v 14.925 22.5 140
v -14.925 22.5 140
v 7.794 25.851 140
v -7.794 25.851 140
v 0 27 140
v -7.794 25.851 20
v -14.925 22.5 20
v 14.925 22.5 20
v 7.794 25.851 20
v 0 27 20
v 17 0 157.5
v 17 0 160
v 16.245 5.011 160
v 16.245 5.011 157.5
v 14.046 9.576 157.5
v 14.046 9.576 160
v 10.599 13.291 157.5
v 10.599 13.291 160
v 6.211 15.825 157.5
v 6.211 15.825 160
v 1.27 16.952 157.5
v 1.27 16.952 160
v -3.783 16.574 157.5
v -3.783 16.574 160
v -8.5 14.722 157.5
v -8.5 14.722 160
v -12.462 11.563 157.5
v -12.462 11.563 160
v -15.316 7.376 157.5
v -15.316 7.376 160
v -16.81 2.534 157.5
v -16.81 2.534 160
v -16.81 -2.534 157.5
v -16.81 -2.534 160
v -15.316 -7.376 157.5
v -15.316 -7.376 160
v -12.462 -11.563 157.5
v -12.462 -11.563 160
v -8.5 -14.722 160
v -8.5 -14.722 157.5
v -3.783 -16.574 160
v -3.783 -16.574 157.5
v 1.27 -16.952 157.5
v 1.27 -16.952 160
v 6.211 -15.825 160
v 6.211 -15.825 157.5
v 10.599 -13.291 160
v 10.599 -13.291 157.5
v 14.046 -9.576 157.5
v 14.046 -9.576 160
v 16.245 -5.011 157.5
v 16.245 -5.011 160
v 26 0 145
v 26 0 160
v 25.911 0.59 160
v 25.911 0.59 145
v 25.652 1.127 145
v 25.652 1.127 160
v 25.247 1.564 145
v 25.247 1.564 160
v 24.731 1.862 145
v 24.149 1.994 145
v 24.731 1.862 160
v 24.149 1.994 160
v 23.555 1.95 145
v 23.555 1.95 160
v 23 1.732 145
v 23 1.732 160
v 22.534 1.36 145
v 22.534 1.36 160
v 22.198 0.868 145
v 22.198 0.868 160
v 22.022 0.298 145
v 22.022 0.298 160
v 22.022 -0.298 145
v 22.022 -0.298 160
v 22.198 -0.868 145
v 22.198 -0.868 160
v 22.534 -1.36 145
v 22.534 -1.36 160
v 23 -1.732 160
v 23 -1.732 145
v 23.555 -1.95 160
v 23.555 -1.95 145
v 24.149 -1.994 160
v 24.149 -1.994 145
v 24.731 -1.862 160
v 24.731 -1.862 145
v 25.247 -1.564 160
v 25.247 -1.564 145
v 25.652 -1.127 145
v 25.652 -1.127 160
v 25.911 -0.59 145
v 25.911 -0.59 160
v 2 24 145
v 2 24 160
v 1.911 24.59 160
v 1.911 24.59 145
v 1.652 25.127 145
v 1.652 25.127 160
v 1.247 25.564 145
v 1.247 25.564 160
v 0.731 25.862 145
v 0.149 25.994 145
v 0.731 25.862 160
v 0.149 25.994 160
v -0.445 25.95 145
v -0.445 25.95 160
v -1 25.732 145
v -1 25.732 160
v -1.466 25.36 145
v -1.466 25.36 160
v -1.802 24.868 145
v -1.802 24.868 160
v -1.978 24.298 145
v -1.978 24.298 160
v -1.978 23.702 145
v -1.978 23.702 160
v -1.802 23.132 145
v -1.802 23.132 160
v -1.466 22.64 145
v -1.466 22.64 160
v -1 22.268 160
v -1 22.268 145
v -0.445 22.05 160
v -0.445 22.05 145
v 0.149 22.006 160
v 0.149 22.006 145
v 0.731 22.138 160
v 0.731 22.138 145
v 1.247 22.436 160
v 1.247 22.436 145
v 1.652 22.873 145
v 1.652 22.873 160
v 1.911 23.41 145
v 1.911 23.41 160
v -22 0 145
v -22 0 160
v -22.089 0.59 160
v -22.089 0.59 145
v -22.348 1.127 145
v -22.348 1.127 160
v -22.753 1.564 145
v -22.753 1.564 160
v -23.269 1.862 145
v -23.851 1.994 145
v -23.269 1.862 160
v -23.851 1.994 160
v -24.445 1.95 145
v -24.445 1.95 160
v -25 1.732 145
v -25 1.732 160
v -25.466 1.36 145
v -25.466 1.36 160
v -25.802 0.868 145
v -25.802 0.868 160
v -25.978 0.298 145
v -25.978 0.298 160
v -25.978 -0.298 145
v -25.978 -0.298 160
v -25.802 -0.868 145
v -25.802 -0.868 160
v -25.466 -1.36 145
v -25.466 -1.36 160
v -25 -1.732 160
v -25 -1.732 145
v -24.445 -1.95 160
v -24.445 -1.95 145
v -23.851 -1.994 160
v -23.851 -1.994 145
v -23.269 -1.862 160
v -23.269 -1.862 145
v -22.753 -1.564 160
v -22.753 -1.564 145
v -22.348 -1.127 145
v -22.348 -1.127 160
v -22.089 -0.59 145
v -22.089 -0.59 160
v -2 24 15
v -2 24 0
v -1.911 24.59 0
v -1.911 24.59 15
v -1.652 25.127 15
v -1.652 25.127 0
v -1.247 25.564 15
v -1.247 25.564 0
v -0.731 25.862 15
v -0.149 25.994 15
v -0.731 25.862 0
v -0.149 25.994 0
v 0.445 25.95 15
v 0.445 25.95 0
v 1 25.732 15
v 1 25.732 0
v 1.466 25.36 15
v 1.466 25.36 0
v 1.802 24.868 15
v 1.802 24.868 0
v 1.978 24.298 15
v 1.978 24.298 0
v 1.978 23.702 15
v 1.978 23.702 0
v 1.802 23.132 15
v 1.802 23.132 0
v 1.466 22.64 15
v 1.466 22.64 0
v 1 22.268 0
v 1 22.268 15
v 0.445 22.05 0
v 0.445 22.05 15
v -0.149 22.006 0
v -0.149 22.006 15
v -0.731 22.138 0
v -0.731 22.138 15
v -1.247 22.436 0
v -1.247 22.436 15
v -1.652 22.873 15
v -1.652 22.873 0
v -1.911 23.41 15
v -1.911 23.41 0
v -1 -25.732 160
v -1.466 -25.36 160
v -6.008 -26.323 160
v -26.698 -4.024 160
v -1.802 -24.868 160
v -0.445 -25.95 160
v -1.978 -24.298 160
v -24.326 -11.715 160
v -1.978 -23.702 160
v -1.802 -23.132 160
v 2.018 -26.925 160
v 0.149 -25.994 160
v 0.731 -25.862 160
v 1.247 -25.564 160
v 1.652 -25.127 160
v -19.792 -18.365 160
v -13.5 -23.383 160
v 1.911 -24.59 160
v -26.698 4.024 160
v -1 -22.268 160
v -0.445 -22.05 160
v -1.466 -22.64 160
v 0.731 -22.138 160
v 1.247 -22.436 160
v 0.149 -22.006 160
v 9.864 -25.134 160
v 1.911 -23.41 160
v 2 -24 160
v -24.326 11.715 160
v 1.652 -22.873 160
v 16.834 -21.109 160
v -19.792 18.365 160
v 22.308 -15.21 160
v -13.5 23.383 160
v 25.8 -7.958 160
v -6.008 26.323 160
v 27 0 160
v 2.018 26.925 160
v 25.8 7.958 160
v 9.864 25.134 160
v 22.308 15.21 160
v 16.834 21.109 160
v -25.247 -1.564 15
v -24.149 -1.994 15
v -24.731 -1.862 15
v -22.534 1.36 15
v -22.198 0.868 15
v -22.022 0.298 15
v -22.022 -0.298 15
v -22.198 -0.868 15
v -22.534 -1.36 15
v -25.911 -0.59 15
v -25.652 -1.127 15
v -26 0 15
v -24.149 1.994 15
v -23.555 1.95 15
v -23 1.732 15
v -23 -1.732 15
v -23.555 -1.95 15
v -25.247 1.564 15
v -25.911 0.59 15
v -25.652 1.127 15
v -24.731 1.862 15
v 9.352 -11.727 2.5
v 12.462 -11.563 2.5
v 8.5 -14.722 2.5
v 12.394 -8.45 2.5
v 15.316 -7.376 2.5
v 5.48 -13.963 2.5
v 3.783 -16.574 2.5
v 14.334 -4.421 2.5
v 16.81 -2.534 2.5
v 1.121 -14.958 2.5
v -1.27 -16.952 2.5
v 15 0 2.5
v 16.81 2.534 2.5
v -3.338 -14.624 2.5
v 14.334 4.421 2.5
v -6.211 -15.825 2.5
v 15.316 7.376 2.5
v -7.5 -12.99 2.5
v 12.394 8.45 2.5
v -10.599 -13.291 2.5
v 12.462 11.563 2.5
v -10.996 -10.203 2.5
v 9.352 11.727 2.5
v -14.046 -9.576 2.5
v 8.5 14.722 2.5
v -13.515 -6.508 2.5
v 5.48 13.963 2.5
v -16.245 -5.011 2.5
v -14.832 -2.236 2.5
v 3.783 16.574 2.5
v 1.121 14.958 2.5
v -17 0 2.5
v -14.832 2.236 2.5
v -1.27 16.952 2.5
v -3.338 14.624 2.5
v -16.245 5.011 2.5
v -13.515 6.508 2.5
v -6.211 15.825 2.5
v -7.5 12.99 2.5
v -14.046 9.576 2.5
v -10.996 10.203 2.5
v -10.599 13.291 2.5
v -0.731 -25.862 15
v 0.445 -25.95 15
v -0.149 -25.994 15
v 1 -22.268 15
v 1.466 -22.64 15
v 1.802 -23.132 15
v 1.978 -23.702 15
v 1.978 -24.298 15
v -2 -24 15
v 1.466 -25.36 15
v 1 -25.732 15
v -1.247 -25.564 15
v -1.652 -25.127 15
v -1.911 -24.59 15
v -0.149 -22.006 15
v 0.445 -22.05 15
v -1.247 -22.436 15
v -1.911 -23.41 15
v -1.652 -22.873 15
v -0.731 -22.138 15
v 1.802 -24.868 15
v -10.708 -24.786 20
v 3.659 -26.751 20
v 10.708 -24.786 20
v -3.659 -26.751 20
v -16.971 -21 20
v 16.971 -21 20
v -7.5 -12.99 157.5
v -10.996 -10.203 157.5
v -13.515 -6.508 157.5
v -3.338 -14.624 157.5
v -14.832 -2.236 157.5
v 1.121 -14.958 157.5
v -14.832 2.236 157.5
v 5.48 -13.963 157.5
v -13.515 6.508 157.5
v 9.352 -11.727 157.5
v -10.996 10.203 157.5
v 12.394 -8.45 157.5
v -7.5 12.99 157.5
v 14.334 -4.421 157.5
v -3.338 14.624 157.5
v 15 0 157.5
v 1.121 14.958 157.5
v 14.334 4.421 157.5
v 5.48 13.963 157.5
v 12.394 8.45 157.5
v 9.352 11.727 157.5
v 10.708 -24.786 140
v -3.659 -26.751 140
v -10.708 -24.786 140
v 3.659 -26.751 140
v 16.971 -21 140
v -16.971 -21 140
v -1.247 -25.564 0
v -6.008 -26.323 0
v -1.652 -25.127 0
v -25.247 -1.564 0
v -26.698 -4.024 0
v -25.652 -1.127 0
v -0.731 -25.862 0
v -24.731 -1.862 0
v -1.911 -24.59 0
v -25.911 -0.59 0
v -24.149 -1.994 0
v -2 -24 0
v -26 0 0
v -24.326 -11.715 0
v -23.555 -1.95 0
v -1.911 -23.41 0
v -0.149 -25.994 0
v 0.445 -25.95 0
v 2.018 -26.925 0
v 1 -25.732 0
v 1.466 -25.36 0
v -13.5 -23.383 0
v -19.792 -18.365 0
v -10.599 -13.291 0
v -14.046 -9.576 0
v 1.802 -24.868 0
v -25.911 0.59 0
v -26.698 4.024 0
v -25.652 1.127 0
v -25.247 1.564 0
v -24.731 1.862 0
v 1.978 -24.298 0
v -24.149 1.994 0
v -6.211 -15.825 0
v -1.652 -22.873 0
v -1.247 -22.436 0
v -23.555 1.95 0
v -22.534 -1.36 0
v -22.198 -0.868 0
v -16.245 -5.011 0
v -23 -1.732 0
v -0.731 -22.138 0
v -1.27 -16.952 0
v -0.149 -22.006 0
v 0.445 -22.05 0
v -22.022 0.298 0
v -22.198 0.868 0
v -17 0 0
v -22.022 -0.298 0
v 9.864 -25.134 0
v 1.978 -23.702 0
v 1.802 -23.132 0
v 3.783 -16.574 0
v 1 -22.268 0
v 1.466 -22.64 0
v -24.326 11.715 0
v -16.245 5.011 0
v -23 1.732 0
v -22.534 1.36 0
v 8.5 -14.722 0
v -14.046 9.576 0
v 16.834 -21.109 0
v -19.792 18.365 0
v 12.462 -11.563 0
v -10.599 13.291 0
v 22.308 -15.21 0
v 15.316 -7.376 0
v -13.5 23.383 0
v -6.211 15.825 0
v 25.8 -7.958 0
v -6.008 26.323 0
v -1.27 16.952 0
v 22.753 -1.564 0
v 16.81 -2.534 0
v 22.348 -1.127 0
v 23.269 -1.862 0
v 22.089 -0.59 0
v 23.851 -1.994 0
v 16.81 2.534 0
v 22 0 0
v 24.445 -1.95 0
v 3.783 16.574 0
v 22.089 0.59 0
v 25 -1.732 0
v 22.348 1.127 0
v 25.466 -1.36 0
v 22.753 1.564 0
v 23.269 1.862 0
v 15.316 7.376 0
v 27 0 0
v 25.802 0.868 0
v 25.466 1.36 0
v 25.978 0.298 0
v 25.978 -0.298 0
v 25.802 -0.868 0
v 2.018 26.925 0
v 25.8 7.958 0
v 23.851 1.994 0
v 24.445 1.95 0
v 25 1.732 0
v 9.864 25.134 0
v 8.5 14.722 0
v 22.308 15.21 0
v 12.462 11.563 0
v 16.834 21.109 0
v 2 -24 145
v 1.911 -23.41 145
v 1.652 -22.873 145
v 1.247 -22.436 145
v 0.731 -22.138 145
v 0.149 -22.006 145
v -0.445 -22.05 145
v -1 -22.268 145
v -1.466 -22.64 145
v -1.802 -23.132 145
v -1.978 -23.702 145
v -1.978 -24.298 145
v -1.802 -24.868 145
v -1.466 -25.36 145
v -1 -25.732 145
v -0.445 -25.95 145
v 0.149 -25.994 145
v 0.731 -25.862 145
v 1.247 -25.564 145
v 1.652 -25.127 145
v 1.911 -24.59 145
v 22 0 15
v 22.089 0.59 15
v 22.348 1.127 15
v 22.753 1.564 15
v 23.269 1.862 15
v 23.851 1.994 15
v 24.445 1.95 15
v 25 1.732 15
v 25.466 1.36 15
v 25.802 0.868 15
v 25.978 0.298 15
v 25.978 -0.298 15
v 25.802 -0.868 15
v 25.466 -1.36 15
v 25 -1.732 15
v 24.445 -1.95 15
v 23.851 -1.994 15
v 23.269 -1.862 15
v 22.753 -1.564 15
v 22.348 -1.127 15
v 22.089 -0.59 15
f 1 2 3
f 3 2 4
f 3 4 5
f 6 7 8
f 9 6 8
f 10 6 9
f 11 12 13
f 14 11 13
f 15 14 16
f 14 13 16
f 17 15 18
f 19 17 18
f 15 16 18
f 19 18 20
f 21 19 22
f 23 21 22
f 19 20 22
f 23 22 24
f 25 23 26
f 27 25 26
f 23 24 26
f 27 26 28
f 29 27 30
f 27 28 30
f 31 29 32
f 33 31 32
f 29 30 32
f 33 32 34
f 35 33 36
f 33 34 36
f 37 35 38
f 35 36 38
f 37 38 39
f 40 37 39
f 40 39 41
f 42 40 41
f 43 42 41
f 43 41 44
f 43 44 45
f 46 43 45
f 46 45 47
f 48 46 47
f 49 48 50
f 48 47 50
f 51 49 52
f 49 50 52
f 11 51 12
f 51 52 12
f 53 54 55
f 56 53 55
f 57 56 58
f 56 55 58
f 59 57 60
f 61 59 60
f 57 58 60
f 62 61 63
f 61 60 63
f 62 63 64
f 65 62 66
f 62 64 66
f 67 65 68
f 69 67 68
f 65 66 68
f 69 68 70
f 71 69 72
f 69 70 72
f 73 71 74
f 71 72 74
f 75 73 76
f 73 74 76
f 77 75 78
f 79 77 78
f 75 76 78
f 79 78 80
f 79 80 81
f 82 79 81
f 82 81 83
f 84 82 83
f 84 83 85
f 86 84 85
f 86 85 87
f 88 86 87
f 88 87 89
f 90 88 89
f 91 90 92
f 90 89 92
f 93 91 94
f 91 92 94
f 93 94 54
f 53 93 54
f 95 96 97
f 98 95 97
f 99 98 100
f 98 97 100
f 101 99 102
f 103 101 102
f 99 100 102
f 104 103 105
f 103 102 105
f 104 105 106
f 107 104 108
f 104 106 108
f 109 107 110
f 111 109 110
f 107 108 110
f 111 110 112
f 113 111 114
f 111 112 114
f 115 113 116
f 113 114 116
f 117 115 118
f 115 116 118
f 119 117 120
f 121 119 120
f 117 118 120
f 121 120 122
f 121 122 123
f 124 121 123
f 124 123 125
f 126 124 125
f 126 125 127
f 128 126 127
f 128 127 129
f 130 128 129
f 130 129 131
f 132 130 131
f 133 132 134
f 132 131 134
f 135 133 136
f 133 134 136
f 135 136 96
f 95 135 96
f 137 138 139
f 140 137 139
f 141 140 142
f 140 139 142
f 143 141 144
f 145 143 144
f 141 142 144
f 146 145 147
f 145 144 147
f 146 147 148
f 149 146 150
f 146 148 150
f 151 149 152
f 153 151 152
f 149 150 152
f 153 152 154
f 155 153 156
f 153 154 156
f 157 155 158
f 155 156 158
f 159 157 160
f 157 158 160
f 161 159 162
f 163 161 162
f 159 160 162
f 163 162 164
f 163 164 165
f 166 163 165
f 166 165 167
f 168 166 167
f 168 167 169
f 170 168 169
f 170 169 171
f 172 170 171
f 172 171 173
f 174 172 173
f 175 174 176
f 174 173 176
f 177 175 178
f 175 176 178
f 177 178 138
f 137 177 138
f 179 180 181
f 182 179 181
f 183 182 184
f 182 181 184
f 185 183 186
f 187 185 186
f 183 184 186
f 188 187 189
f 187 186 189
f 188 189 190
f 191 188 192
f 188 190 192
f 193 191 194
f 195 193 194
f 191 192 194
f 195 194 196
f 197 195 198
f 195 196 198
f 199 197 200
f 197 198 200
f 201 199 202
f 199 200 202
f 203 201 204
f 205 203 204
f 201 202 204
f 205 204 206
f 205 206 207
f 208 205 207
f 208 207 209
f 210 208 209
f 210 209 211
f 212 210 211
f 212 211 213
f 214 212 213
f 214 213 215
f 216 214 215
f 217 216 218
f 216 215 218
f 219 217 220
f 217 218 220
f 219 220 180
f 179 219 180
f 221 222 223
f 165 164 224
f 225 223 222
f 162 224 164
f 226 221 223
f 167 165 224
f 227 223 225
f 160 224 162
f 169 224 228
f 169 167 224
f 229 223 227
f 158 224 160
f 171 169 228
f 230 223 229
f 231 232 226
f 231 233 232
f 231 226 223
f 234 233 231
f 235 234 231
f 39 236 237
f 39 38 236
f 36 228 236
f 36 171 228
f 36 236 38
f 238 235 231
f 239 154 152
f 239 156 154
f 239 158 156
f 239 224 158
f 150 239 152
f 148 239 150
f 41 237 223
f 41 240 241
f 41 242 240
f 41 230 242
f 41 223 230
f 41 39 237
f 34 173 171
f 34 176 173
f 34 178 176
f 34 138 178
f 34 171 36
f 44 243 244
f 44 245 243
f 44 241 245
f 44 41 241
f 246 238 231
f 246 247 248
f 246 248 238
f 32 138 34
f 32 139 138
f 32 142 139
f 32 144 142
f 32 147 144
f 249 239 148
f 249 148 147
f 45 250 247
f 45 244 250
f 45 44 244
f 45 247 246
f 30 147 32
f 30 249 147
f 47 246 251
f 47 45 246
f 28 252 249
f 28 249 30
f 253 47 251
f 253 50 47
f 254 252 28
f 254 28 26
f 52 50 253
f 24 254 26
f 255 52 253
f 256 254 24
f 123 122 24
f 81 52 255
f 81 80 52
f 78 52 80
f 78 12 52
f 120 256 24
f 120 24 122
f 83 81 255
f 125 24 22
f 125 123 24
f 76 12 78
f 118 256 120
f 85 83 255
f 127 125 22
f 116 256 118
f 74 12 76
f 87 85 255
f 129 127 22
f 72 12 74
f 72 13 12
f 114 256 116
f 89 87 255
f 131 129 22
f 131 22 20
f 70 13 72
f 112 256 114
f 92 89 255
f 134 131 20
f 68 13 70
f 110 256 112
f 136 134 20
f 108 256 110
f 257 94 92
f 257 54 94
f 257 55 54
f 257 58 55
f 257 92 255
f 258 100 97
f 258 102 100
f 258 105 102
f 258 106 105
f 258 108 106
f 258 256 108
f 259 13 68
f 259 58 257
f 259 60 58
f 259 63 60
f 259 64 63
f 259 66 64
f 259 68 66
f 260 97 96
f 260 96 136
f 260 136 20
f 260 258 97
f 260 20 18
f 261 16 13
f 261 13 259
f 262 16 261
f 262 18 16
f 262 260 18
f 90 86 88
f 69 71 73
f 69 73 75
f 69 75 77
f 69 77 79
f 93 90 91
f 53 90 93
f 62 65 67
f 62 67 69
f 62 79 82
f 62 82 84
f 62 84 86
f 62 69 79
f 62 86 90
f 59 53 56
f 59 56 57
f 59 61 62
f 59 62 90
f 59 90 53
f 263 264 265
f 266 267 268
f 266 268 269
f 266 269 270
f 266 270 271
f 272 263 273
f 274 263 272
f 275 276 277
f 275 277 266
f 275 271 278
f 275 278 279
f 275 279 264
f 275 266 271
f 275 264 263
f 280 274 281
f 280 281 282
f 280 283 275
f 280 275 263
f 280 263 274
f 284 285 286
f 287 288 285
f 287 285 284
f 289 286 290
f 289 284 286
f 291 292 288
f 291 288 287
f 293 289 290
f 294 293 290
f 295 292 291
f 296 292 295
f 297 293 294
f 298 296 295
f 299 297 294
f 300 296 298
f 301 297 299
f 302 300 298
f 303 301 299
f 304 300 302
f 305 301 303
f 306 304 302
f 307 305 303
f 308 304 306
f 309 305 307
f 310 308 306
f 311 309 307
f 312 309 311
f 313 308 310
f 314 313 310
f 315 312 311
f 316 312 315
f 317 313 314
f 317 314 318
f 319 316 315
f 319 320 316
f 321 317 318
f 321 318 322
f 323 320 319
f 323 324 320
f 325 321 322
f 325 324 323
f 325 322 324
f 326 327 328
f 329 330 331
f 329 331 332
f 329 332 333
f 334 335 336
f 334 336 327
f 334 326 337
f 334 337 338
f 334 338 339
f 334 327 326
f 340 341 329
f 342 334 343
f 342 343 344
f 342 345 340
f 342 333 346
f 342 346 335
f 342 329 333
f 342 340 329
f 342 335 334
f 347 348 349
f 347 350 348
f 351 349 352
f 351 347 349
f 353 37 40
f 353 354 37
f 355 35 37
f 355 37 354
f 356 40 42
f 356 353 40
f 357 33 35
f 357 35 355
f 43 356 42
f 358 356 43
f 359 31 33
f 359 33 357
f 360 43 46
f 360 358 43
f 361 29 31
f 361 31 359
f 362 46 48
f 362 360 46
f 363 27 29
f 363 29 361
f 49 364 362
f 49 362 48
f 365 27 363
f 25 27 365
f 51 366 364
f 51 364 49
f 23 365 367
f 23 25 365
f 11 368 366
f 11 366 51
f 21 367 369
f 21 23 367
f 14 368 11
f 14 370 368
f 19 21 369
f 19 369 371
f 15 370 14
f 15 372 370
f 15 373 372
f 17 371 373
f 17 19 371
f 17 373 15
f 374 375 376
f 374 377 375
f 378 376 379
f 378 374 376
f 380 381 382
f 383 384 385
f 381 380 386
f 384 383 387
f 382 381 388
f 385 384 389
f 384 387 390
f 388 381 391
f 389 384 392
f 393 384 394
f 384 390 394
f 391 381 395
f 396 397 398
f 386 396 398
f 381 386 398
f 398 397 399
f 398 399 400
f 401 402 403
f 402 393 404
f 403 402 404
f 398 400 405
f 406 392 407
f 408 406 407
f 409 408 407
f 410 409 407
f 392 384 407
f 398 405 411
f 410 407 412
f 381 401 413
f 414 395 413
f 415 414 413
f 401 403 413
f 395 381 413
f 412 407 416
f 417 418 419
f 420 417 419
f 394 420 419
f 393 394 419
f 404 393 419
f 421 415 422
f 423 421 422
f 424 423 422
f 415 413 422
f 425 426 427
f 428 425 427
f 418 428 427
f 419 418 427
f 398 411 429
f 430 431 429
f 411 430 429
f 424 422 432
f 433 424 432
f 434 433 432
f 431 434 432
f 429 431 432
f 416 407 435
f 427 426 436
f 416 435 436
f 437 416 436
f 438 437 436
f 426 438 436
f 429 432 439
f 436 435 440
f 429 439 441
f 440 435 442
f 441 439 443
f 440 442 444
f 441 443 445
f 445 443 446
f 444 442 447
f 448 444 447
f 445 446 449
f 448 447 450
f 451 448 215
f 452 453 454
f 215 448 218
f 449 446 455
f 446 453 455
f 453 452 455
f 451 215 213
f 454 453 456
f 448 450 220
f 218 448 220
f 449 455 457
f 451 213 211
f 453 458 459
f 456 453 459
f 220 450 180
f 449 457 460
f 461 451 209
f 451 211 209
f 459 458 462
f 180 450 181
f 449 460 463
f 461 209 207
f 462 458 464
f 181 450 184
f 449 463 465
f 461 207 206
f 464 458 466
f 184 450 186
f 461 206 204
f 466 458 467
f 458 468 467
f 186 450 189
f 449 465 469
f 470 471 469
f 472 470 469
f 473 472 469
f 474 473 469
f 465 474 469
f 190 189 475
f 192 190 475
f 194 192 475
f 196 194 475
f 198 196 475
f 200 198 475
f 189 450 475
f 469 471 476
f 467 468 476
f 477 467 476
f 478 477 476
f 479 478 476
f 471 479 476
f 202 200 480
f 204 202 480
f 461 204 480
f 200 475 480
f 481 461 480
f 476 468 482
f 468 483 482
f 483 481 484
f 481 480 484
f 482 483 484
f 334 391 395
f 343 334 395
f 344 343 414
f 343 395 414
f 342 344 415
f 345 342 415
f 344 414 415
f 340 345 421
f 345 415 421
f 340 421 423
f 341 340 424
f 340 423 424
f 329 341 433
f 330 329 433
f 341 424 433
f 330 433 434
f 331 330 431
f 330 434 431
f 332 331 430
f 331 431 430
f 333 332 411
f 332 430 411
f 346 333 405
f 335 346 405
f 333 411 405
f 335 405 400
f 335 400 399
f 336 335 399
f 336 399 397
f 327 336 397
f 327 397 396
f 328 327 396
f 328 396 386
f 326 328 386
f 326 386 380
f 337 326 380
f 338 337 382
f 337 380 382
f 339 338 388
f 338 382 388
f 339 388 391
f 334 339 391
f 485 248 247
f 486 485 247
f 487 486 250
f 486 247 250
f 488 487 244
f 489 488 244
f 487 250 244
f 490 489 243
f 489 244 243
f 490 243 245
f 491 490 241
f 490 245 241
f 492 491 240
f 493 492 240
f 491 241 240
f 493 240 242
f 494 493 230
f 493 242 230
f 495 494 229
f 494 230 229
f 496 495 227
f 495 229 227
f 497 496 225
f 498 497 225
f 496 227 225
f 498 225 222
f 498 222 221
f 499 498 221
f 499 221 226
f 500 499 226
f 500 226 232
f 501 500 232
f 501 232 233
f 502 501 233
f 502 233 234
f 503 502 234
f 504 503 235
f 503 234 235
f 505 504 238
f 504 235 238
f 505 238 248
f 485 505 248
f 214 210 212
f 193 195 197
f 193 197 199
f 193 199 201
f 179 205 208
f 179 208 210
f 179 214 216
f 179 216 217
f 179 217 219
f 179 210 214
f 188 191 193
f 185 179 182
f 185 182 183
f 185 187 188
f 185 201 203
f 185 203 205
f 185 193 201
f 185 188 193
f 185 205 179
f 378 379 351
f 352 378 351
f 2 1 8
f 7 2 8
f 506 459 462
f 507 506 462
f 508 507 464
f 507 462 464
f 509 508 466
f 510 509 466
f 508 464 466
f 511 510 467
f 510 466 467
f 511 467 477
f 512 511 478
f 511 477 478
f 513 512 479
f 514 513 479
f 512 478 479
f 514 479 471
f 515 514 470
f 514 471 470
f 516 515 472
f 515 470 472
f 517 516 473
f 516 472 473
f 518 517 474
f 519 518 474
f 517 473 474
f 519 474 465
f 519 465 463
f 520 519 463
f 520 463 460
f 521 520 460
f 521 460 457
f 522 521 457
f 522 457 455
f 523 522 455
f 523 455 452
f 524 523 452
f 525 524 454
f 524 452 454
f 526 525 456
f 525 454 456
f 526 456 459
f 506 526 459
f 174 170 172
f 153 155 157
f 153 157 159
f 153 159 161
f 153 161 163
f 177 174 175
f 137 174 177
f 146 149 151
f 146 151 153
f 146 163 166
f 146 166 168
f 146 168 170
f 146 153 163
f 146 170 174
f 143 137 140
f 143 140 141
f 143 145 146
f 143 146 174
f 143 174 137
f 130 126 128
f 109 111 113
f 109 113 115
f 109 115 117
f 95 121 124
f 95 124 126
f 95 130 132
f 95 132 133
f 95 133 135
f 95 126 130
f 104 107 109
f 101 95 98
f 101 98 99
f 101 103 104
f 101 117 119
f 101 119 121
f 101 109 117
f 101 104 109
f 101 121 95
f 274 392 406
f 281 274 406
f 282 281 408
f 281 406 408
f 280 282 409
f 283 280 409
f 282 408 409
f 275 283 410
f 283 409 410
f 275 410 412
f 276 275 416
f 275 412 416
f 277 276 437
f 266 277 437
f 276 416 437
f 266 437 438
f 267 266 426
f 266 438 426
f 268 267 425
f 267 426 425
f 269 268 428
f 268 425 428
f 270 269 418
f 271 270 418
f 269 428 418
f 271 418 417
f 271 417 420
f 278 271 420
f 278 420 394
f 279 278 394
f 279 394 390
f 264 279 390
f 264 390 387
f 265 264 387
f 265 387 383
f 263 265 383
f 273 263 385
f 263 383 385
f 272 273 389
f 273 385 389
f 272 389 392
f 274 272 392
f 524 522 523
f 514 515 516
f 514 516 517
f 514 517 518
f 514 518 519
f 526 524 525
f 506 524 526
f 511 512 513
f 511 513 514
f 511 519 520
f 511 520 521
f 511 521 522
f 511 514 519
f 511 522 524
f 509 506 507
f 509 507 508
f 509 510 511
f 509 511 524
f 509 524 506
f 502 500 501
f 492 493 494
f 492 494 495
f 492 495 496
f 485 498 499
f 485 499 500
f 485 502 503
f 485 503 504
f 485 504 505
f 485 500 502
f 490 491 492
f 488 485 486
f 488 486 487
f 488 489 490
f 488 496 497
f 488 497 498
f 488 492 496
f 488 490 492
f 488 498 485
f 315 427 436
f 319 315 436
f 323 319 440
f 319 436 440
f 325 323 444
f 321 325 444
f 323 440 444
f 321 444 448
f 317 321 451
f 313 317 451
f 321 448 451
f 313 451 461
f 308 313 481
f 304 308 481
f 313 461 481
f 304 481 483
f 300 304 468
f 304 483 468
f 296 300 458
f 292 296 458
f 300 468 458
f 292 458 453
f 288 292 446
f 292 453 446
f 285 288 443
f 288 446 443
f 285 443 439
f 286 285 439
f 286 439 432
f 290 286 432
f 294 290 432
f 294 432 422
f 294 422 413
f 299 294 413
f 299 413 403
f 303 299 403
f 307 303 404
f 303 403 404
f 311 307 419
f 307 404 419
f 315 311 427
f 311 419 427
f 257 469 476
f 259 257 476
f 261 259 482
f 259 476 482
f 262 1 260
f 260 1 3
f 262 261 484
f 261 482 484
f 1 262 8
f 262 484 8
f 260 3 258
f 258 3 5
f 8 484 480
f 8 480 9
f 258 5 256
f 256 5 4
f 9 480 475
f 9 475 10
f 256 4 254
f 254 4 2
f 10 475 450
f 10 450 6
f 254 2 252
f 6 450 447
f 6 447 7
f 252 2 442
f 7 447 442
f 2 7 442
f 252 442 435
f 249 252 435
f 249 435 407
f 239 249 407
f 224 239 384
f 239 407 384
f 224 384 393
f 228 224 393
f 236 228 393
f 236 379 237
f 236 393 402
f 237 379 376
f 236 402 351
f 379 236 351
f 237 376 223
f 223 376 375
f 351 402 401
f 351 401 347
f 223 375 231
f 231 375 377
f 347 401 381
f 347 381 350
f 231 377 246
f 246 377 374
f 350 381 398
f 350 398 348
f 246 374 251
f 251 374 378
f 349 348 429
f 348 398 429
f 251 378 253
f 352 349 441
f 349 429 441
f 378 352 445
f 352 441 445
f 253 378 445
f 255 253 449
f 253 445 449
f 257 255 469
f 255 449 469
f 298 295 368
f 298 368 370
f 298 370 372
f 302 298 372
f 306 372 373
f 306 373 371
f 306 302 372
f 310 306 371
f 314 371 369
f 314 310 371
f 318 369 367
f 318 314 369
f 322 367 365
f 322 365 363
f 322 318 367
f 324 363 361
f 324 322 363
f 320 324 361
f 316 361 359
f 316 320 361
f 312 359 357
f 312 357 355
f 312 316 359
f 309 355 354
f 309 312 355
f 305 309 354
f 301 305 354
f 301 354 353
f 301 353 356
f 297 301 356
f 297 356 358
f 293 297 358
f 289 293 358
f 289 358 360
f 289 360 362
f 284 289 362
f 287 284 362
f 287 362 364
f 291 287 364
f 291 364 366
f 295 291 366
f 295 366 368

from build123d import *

# Parameters (mm, degrees)
ESQUISSE1_R           = 27
ESQUISSE1_R_2         = 15
EXTRUSION1_DEPTH      = 160
ESQUISSE2_R           = 2
EXTRUSION2_DEPTH      = 15
ESQUISSE3_R           = 2
EXTRUSION3_DEPTH      = 15
ESQUISSE4_R           = 17
ESQUISSE4_R_2         = 15
EXTRUSION4_DEPTH      = 2.5
ESQUISSE5_R           = 17
ESQUISSE5_R_2         = 15
EXTRUSION5_DEPTH      = 2.5
ESQUISSE6_W           = 120
ESQUISSE6_H           = 4.5
ESQUISSE6_H_2         = 6
EXTRUSION6_DEPTH      = 28
EXTRUSION6_DEPTH_BACK = 28


with BuildPart() as part:
    # Esquisse1 → Extrusion1 (new body)
    with BuildSketch(Plane.XY):
        Circle(ESQUISSE1_R)
        Circle(ESQUISSE1_R_2, mode=Mode.SUBTRACT)
    extrude(amount=EXTRUSION1_DEPTH)

    # Esquisse2 → Extrusion2 (cut)
    with BuildSketch(Plane.XY.offset(160)):
        with Locations((0, 24)):
            Circle(ESQUISSE2_R)
        with Locations((24, 0)):
            Circle(ESQUISSE2_R)
        with Locations((0, -24)):
            Circle(ESQUISSE2_R)
        with Locations((-24, 0)):
            Circle(ESQUISSE2_R)
    extrude(amount=-EXTRUSION2_DEPTH, mode=Mode.SUBTRACT)

    # Esquisse3 → Extrusion3 (cut)
    with BuildSketch(Plane(origin=(0, 0, 0), x_dir=(-1, 0, 0), z_dir=(0, 0, -1))):
        with Locations((0, 24)):
            Circle(ESQUISSE3_R)
        with Locations((24, 0)):
            Circle(ESQUISSE3_R)
        with Locations((0, -24)):
            Circle(ESQUISSE3_R)
        with Locations((-24, 0)):
            Circle(ESQUISSE3_R)
    extrude(amount=-EXTRUSION3_DEPTH, mode=Mode.SUBTRACT)

    # Esquisse4 → Extrusion4 (cut)
    with BuildSketch(Plane.XY.offset(160)):
        Circle(ESQUISSE4_R)
        Circle(ESQUISSE4_R_2, mode=Mode.SUBTRACT)
    extrude(amount=-EXTRUSION4_DEPTH, mode=Mode.SUBTRACT)

    # Esquisse5 → Extrusion5 (cut)
    with BuildSketch(Plane(origin=(0, 0, 0), x_dir=(-1, 0, 0), z_dir=(0, 0, -1))):
        Circle(ESQUISSE5_R)
        Circle(ESQUISSE5_R_2, mode=Mode.SUBTRACT)
    extrude(amount=-EXTRUSION5_DEPTH, mode=Mode.SUBTRACT)

    # Esquisse6 → Extrusion6 (cut, two sides)
    with BuildSketch(Plane(origin=(0, 0, 0), x_dir=(0, 0, -1), z_dir=(1, 0, 0))) as extrusion6_sk:
        with Locations((-80, 24.75)):
            Rectangle(ESQUISSE6_W, ESQUISSE6_H)
        with Locations((-80, -24)):
            Rectangle(ESQUISSE6_W, ESQUISSE6_H_2)
    extrude(amount=EXTRUSION6_DEPTH, mode=Mode.SUBTRACT)
    extrude(extrusion6_sk.sketch, amount=-EXTRUSION6_DEPTH_BACK, mode=Mode.SUBTRACT)


solid = part.part
